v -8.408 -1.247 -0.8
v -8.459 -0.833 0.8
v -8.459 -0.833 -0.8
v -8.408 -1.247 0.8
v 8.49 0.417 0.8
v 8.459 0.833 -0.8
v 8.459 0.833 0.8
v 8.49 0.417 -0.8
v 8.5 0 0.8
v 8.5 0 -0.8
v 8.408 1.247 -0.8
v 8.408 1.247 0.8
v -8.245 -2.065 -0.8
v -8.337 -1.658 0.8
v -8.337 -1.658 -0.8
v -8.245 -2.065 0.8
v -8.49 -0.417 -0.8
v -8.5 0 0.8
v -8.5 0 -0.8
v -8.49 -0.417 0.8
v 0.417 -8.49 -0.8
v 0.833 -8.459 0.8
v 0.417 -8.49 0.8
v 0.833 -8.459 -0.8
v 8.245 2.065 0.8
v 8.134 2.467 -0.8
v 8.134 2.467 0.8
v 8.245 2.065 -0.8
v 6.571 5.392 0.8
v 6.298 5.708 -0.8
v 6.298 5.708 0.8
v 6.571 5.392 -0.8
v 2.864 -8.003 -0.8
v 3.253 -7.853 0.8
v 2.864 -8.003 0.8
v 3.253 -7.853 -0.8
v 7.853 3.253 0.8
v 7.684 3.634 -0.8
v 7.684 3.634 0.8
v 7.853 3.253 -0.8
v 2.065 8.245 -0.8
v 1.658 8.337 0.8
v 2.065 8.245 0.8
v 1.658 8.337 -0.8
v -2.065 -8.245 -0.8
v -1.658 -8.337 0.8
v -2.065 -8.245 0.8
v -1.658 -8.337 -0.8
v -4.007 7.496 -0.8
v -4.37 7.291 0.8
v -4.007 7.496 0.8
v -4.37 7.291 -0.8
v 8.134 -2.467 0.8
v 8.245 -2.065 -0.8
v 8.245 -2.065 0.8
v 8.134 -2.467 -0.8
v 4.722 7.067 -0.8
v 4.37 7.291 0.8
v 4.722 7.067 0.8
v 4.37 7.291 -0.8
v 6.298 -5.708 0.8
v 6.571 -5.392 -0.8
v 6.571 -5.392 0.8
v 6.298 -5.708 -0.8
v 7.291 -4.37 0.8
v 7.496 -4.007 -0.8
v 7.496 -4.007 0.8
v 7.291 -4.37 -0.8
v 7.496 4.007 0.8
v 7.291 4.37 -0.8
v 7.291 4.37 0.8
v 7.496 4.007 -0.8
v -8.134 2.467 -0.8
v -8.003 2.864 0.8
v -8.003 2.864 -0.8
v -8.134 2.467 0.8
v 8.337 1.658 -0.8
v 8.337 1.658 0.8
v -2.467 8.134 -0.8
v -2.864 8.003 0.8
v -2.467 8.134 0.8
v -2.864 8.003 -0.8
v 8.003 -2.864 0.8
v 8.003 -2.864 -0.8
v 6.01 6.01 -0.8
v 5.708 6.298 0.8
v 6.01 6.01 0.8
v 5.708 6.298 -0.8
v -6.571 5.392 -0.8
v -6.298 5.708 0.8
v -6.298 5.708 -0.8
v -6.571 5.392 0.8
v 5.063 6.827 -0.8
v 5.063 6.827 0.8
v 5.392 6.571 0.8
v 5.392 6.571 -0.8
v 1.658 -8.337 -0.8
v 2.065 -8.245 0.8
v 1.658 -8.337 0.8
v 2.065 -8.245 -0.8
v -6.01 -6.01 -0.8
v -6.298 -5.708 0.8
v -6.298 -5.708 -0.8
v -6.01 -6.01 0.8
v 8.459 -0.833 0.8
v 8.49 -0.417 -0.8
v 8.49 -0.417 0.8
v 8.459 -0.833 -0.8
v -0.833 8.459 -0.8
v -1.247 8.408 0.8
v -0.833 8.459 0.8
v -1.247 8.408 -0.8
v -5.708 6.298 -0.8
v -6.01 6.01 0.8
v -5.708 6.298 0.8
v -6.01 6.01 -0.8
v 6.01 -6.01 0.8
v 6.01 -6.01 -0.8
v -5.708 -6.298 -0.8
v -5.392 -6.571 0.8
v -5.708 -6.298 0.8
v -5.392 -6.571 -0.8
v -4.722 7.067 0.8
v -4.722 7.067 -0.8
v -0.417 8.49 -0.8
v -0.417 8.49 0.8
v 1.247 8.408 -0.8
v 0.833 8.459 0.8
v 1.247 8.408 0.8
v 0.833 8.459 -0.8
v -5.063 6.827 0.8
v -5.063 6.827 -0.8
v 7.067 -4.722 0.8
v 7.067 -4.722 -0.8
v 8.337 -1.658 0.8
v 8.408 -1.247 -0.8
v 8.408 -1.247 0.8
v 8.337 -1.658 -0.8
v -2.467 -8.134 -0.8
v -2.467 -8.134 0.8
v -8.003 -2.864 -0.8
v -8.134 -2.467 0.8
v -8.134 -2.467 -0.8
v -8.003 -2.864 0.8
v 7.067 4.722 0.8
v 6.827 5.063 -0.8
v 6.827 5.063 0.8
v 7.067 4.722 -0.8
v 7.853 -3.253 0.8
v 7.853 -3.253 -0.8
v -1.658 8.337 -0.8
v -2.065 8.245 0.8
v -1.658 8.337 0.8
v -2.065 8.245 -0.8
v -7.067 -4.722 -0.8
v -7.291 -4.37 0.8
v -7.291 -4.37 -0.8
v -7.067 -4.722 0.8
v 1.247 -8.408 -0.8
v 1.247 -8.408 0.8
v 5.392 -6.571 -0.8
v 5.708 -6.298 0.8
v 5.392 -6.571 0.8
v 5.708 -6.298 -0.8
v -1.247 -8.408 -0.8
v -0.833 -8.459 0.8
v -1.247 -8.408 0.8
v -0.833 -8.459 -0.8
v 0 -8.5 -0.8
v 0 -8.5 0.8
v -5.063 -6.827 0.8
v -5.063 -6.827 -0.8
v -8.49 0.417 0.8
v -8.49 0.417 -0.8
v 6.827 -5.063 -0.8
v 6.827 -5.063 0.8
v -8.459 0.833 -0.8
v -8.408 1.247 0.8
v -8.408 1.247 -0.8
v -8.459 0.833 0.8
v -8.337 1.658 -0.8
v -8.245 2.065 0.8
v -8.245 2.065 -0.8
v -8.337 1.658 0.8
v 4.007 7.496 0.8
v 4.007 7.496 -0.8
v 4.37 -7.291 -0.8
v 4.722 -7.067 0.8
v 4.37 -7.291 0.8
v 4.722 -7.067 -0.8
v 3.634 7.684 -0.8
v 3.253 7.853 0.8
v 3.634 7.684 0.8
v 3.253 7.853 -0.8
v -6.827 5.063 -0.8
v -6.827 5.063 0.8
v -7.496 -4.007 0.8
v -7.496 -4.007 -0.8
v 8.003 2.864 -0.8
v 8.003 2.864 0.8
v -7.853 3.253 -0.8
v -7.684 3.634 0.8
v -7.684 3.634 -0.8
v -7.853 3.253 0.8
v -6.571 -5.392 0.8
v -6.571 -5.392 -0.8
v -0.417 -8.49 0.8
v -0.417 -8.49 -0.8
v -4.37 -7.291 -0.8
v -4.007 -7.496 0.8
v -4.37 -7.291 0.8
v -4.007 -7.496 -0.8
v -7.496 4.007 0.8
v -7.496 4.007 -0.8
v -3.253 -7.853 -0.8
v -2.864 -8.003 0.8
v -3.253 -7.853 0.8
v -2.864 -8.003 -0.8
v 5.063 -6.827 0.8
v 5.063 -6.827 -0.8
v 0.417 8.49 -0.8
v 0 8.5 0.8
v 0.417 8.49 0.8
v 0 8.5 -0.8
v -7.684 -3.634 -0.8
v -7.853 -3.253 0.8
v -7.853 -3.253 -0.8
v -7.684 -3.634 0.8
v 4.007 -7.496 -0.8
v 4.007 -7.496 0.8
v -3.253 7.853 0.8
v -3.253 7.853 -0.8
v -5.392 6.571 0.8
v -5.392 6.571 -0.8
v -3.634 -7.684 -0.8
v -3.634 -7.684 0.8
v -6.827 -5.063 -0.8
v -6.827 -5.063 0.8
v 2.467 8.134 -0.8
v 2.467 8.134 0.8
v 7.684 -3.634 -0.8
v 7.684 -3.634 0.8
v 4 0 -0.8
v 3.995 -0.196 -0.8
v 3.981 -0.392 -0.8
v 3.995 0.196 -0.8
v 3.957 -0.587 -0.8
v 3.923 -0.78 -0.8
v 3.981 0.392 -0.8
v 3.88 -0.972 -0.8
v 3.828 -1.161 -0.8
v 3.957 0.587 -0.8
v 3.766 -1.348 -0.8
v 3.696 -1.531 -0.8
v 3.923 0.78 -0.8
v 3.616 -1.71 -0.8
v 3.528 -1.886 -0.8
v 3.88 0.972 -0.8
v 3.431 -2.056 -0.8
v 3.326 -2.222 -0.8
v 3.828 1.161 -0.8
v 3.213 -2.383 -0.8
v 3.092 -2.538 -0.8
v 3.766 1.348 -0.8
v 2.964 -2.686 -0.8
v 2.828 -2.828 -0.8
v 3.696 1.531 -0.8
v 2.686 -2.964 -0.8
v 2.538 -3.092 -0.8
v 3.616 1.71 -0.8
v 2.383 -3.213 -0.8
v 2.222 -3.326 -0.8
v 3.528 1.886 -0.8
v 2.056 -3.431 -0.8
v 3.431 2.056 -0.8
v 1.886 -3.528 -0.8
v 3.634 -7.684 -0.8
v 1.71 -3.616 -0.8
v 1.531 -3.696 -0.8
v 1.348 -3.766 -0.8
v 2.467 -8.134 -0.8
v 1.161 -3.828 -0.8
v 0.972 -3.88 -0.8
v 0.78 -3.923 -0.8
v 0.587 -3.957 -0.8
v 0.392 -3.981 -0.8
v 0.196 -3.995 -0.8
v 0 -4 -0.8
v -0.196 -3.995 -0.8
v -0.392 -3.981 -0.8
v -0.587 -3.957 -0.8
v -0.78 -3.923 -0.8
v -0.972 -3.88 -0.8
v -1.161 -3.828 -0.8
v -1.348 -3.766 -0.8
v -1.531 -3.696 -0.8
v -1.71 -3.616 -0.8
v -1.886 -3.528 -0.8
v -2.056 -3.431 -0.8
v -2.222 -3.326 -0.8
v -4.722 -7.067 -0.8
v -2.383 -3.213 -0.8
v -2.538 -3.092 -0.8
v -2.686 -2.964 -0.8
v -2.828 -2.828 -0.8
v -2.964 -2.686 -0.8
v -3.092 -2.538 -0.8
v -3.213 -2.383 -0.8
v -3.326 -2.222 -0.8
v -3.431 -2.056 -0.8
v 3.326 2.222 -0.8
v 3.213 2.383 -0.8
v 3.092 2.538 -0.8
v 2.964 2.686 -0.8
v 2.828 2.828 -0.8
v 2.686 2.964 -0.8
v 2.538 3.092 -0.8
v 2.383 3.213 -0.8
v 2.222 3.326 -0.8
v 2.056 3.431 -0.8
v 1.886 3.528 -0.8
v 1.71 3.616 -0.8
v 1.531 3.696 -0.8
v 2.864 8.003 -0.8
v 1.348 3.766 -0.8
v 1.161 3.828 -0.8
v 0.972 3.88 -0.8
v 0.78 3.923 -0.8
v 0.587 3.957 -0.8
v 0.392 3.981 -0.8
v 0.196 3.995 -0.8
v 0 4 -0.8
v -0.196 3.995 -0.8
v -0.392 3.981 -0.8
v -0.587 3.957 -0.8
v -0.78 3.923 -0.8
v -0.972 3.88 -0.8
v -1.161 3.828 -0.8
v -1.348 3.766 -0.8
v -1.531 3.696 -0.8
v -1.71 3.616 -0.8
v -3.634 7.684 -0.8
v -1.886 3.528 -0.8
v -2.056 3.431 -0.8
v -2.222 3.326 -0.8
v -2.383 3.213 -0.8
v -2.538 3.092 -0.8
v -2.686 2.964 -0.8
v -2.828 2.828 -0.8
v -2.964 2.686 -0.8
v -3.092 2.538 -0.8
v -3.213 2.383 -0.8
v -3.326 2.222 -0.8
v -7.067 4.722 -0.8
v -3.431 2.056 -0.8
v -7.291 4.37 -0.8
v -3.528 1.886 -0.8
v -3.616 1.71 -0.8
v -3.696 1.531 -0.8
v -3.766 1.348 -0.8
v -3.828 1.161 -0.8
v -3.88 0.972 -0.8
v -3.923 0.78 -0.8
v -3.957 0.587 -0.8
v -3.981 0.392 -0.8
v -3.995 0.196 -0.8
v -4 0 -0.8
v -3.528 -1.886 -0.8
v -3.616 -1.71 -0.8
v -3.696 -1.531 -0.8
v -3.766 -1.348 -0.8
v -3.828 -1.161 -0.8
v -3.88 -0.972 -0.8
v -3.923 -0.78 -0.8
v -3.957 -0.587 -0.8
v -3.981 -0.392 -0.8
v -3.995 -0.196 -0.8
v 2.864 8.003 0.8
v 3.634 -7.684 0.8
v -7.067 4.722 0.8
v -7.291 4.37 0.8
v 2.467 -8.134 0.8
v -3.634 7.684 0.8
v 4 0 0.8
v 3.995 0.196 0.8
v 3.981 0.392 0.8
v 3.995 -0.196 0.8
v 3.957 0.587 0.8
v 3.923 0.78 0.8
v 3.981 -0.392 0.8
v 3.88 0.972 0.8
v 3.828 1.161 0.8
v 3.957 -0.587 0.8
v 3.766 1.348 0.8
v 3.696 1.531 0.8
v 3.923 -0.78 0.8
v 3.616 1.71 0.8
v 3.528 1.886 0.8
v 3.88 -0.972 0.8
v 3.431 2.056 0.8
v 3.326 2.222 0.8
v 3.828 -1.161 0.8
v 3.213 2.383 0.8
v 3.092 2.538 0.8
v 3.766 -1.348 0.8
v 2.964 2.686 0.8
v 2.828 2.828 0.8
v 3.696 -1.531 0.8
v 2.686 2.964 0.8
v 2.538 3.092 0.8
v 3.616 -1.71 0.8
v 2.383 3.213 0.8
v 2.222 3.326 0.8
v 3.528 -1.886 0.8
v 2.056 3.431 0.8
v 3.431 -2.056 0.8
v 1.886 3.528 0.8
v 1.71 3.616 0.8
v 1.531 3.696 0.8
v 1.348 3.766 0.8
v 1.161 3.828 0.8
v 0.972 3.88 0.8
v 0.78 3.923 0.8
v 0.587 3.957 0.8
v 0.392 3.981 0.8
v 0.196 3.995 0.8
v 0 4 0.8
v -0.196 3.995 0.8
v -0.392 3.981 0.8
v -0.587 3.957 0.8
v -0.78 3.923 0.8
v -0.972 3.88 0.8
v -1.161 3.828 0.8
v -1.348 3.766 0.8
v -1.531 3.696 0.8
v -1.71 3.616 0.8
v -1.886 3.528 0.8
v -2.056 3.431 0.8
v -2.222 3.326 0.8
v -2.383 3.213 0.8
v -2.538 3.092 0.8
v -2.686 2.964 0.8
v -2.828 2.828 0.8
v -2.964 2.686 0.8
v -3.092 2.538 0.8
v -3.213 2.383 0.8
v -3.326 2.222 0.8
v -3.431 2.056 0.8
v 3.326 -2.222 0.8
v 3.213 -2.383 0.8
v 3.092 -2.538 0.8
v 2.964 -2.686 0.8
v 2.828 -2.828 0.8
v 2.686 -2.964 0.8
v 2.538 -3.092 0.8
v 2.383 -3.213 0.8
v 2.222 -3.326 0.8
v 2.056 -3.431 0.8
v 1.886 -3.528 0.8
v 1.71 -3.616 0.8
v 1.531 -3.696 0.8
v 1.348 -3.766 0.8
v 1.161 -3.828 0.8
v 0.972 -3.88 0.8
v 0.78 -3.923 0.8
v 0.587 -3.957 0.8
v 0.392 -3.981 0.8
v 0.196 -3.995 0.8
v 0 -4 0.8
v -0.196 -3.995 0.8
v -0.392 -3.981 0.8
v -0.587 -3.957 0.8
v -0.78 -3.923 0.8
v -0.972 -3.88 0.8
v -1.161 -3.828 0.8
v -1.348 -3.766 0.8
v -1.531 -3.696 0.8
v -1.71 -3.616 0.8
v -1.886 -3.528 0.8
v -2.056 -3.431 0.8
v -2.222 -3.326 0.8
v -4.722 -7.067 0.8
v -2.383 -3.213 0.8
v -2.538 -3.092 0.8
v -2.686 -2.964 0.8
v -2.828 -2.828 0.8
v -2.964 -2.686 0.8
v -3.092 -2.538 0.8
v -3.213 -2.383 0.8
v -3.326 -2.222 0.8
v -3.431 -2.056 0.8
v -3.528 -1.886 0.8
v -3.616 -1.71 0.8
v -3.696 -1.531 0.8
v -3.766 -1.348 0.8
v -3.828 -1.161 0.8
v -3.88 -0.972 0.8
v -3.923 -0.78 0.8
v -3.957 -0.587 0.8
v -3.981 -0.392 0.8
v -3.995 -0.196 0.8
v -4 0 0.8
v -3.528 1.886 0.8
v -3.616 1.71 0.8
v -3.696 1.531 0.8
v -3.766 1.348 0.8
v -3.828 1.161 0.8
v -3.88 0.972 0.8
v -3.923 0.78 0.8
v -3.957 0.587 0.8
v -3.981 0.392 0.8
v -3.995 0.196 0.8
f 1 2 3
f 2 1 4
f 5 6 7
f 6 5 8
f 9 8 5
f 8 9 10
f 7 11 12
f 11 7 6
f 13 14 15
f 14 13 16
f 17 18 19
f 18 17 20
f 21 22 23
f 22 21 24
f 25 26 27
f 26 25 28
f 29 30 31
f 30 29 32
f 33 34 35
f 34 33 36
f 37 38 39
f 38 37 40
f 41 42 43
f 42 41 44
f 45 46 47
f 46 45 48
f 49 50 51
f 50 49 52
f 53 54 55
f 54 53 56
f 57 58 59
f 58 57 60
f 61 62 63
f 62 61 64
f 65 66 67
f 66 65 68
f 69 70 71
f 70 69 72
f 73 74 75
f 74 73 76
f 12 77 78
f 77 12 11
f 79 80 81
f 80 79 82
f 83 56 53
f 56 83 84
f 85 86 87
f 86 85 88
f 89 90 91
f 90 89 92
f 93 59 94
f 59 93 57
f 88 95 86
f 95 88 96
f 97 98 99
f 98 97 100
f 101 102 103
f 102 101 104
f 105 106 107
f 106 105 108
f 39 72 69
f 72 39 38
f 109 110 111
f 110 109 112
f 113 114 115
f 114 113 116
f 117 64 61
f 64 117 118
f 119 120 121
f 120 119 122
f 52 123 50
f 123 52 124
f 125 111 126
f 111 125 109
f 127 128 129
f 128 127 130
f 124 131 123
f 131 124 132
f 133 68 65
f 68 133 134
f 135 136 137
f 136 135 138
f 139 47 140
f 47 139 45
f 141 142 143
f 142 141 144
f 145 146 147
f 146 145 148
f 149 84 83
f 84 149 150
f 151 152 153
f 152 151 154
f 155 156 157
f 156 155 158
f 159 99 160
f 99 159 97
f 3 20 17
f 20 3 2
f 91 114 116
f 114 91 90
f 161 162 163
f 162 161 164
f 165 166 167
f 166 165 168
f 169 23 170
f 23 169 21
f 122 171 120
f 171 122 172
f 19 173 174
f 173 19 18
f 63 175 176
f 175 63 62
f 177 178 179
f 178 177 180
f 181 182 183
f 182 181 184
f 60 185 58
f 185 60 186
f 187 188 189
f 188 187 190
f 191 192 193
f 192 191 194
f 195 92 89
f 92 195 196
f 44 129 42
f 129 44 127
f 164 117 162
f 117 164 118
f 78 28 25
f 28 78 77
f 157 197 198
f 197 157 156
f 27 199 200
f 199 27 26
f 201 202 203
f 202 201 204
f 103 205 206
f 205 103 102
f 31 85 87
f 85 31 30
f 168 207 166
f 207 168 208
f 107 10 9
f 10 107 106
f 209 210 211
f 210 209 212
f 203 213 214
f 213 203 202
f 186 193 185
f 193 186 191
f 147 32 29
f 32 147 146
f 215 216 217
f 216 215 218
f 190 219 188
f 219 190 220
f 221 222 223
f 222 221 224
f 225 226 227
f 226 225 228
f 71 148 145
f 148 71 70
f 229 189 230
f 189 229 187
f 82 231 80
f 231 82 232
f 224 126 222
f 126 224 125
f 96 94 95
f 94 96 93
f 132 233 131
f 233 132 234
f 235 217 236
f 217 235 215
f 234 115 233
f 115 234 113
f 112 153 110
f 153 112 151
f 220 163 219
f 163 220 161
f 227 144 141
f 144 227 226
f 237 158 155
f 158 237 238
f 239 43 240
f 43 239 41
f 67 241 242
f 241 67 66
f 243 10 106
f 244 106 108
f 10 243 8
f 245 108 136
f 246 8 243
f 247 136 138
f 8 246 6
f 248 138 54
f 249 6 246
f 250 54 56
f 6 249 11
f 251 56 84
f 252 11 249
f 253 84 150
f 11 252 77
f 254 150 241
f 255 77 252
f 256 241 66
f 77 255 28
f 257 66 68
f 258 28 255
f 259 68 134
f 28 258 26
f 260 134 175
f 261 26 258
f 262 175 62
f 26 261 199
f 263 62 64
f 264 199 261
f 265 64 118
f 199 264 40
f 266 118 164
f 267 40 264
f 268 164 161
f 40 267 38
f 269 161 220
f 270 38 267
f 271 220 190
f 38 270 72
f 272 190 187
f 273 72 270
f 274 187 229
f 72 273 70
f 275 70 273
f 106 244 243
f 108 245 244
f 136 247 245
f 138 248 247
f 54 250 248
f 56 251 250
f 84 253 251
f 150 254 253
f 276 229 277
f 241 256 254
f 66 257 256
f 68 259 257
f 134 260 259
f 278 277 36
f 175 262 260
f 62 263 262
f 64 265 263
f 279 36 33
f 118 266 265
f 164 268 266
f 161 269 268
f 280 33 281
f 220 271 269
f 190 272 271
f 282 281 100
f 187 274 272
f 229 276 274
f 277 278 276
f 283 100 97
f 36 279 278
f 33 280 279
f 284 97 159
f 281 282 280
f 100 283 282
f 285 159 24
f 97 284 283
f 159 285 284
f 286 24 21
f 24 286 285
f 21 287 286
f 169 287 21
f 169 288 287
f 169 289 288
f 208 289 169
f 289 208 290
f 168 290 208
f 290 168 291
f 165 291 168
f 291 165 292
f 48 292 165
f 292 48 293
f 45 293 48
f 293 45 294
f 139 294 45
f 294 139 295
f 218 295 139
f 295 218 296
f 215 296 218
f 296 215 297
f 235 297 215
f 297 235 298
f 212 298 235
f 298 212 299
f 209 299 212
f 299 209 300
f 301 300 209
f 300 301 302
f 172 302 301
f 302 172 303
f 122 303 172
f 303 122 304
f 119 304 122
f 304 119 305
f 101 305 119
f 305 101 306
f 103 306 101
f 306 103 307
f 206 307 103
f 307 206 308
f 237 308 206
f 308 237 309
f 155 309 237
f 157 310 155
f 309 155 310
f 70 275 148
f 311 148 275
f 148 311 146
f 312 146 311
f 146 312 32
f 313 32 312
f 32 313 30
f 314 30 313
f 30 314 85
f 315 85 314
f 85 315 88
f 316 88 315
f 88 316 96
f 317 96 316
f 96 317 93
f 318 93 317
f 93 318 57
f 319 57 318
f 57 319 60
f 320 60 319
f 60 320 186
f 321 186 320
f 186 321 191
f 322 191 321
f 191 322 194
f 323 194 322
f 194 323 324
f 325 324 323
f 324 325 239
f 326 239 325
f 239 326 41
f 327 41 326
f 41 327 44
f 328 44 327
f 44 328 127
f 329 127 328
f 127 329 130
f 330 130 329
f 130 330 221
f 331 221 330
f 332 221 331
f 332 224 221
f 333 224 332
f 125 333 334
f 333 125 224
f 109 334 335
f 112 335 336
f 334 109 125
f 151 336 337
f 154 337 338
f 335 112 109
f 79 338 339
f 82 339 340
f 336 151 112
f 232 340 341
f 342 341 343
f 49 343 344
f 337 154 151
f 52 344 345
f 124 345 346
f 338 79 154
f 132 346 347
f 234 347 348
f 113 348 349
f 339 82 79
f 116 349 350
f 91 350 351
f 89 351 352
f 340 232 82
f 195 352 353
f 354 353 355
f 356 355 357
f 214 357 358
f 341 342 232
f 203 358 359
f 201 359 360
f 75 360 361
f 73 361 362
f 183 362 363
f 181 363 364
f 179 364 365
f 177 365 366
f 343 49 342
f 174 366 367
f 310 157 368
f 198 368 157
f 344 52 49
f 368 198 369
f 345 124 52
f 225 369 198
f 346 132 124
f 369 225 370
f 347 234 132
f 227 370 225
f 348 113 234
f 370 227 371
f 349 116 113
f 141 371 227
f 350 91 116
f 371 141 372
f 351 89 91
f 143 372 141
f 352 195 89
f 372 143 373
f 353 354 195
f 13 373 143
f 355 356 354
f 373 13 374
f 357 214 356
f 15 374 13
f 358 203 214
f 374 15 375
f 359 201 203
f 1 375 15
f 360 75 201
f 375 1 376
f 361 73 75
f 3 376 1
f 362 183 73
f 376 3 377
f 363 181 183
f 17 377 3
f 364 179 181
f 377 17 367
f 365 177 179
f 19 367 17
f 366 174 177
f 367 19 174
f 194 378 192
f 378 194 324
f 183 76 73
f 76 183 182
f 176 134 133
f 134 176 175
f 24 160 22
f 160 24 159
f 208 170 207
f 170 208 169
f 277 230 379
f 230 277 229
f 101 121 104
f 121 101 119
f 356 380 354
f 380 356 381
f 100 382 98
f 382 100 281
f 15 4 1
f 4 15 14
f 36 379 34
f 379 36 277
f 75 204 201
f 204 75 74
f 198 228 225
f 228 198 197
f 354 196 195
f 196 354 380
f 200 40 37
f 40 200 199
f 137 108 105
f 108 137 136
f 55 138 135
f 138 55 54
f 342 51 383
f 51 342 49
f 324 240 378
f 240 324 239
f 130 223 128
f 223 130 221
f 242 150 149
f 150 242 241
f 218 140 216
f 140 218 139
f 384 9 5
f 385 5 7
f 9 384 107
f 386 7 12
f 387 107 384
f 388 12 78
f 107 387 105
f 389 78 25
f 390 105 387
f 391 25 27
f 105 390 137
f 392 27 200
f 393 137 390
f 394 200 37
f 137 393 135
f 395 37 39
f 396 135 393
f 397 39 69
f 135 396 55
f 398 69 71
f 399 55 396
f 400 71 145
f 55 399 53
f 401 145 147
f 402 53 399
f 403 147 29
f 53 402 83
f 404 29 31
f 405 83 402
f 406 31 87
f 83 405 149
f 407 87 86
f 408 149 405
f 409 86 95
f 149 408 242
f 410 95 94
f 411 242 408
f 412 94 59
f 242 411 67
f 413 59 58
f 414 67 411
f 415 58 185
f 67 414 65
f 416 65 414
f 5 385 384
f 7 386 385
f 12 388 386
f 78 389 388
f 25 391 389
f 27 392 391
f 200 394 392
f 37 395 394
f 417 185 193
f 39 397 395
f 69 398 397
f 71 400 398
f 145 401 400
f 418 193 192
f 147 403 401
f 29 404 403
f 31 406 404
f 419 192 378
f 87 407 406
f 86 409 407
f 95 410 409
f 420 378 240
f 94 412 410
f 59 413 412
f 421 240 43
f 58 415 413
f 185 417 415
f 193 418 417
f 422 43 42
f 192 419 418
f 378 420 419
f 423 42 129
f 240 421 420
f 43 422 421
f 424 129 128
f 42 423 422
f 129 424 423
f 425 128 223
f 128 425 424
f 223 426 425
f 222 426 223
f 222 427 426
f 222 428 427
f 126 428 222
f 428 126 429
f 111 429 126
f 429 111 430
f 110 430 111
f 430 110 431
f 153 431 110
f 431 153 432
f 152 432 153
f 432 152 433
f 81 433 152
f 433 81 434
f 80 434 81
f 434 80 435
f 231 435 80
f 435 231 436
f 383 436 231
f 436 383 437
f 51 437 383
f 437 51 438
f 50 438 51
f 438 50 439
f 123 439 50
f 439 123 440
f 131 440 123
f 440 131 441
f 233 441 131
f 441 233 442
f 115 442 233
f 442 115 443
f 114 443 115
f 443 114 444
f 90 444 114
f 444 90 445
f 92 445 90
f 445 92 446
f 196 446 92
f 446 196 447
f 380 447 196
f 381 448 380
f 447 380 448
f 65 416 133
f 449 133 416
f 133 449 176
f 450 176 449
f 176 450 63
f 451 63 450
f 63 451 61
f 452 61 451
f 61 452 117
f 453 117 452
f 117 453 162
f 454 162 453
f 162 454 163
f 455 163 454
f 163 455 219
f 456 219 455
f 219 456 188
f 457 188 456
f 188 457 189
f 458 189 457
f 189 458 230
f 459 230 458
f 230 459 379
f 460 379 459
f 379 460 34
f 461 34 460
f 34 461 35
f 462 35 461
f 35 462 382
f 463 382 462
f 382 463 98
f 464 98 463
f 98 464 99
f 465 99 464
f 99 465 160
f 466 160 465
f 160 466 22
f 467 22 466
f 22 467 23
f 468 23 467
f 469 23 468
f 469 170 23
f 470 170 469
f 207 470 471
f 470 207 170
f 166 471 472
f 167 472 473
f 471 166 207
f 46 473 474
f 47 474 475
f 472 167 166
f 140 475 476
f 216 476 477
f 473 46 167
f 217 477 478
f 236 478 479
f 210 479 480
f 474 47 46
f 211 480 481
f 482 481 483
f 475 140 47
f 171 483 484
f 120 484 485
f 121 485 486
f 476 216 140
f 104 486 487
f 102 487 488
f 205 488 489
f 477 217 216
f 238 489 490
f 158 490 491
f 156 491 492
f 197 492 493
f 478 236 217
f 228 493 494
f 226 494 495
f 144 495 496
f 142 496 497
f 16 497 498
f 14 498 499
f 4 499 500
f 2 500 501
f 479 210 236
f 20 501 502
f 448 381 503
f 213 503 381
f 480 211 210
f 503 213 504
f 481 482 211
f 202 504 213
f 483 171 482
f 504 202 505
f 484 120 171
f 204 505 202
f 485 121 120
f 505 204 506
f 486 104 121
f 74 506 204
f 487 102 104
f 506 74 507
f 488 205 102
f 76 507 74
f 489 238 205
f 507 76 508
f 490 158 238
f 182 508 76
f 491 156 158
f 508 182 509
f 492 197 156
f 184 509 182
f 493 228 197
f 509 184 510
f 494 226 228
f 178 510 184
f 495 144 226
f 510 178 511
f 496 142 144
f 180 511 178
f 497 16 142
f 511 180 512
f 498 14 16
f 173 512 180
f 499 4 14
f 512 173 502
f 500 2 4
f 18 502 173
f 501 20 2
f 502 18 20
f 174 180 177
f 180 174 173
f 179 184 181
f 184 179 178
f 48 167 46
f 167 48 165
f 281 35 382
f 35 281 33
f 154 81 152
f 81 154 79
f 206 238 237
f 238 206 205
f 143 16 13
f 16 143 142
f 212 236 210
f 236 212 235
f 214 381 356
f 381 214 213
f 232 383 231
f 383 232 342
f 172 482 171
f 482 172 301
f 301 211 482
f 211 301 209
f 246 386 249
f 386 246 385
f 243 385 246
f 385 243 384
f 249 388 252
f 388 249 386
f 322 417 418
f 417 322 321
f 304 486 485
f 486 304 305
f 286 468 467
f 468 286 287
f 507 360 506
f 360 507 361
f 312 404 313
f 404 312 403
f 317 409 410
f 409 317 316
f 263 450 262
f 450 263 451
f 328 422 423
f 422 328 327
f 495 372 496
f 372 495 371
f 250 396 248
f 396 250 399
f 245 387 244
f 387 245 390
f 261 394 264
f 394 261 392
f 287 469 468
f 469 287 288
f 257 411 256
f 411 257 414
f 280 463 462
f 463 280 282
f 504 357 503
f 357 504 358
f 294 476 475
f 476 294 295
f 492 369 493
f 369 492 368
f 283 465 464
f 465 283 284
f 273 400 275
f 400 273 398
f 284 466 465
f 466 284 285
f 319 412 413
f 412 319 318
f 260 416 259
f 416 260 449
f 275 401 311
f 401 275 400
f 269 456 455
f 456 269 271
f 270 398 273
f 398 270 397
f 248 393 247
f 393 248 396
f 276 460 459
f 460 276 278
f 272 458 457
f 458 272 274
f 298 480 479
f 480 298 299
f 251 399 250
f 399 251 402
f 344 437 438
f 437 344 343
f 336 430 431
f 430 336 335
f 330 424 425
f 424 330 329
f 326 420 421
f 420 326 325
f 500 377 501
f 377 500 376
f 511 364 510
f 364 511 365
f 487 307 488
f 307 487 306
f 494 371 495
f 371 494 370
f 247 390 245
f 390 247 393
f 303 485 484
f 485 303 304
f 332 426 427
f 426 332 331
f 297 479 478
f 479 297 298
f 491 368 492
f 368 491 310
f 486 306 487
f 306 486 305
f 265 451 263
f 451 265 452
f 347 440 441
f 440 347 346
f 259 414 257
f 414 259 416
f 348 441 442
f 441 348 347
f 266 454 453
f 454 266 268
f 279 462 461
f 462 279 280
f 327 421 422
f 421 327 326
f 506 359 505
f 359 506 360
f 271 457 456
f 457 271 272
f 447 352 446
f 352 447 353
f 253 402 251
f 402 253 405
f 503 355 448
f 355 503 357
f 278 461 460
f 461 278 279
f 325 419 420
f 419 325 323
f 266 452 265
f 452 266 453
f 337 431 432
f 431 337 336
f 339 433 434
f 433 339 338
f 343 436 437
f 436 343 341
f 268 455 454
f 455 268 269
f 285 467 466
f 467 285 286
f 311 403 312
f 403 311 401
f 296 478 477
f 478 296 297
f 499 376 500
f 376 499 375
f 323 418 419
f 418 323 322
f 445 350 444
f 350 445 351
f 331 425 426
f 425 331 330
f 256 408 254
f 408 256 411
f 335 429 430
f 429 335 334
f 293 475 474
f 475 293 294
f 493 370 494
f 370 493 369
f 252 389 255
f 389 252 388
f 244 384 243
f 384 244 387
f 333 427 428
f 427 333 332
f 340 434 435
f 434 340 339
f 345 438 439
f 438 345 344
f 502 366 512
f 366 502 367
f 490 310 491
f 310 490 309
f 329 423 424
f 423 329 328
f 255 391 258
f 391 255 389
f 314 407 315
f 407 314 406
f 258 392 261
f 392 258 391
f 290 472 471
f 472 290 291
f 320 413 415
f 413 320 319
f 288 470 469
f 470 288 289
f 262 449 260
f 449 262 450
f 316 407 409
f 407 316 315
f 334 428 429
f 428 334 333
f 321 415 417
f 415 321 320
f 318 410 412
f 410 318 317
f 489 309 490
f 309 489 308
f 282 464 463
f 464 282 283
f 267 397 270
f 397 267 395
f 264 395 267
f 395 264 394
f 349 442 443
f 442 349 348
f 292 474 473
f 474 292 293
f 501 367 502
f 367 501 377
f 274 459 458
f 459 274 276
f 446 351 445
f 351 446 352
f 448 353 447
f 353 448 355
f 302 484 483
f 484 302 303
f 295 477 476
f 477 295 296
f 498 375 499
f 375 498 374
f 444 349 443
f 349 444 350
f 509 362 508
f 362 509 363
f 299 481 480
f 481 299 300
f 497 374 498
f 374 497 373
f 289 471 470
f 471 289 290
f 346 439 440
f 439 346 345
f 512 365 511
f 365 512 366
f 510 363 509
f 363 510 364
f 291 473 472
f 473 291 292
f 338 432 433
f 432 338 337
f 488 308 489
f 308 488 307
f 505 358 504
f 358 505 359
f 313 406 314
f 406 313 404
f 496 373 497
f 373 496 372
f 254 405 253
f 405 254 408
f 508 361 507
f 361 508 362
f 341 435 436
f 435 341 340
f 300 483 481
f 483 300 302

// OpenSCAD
// Flat washer: 8.0mm ID, 17.0mm OD, 1.6mm thickness

inner_diameter_mm = 8.0;
outer_diameter_mm = 17.0;
thickness_mm      = 1.6;

eps_mm = 0.02;          // small overlap for clean boolean
$fn = 128;

difference() {
    cylinder(d=outer_diameter_mm, h=thickness_mm, center=true);
    cylinder(d=inner_diameter_mm, h=thickness_mm + 2*eps_mm, center=true);
}
